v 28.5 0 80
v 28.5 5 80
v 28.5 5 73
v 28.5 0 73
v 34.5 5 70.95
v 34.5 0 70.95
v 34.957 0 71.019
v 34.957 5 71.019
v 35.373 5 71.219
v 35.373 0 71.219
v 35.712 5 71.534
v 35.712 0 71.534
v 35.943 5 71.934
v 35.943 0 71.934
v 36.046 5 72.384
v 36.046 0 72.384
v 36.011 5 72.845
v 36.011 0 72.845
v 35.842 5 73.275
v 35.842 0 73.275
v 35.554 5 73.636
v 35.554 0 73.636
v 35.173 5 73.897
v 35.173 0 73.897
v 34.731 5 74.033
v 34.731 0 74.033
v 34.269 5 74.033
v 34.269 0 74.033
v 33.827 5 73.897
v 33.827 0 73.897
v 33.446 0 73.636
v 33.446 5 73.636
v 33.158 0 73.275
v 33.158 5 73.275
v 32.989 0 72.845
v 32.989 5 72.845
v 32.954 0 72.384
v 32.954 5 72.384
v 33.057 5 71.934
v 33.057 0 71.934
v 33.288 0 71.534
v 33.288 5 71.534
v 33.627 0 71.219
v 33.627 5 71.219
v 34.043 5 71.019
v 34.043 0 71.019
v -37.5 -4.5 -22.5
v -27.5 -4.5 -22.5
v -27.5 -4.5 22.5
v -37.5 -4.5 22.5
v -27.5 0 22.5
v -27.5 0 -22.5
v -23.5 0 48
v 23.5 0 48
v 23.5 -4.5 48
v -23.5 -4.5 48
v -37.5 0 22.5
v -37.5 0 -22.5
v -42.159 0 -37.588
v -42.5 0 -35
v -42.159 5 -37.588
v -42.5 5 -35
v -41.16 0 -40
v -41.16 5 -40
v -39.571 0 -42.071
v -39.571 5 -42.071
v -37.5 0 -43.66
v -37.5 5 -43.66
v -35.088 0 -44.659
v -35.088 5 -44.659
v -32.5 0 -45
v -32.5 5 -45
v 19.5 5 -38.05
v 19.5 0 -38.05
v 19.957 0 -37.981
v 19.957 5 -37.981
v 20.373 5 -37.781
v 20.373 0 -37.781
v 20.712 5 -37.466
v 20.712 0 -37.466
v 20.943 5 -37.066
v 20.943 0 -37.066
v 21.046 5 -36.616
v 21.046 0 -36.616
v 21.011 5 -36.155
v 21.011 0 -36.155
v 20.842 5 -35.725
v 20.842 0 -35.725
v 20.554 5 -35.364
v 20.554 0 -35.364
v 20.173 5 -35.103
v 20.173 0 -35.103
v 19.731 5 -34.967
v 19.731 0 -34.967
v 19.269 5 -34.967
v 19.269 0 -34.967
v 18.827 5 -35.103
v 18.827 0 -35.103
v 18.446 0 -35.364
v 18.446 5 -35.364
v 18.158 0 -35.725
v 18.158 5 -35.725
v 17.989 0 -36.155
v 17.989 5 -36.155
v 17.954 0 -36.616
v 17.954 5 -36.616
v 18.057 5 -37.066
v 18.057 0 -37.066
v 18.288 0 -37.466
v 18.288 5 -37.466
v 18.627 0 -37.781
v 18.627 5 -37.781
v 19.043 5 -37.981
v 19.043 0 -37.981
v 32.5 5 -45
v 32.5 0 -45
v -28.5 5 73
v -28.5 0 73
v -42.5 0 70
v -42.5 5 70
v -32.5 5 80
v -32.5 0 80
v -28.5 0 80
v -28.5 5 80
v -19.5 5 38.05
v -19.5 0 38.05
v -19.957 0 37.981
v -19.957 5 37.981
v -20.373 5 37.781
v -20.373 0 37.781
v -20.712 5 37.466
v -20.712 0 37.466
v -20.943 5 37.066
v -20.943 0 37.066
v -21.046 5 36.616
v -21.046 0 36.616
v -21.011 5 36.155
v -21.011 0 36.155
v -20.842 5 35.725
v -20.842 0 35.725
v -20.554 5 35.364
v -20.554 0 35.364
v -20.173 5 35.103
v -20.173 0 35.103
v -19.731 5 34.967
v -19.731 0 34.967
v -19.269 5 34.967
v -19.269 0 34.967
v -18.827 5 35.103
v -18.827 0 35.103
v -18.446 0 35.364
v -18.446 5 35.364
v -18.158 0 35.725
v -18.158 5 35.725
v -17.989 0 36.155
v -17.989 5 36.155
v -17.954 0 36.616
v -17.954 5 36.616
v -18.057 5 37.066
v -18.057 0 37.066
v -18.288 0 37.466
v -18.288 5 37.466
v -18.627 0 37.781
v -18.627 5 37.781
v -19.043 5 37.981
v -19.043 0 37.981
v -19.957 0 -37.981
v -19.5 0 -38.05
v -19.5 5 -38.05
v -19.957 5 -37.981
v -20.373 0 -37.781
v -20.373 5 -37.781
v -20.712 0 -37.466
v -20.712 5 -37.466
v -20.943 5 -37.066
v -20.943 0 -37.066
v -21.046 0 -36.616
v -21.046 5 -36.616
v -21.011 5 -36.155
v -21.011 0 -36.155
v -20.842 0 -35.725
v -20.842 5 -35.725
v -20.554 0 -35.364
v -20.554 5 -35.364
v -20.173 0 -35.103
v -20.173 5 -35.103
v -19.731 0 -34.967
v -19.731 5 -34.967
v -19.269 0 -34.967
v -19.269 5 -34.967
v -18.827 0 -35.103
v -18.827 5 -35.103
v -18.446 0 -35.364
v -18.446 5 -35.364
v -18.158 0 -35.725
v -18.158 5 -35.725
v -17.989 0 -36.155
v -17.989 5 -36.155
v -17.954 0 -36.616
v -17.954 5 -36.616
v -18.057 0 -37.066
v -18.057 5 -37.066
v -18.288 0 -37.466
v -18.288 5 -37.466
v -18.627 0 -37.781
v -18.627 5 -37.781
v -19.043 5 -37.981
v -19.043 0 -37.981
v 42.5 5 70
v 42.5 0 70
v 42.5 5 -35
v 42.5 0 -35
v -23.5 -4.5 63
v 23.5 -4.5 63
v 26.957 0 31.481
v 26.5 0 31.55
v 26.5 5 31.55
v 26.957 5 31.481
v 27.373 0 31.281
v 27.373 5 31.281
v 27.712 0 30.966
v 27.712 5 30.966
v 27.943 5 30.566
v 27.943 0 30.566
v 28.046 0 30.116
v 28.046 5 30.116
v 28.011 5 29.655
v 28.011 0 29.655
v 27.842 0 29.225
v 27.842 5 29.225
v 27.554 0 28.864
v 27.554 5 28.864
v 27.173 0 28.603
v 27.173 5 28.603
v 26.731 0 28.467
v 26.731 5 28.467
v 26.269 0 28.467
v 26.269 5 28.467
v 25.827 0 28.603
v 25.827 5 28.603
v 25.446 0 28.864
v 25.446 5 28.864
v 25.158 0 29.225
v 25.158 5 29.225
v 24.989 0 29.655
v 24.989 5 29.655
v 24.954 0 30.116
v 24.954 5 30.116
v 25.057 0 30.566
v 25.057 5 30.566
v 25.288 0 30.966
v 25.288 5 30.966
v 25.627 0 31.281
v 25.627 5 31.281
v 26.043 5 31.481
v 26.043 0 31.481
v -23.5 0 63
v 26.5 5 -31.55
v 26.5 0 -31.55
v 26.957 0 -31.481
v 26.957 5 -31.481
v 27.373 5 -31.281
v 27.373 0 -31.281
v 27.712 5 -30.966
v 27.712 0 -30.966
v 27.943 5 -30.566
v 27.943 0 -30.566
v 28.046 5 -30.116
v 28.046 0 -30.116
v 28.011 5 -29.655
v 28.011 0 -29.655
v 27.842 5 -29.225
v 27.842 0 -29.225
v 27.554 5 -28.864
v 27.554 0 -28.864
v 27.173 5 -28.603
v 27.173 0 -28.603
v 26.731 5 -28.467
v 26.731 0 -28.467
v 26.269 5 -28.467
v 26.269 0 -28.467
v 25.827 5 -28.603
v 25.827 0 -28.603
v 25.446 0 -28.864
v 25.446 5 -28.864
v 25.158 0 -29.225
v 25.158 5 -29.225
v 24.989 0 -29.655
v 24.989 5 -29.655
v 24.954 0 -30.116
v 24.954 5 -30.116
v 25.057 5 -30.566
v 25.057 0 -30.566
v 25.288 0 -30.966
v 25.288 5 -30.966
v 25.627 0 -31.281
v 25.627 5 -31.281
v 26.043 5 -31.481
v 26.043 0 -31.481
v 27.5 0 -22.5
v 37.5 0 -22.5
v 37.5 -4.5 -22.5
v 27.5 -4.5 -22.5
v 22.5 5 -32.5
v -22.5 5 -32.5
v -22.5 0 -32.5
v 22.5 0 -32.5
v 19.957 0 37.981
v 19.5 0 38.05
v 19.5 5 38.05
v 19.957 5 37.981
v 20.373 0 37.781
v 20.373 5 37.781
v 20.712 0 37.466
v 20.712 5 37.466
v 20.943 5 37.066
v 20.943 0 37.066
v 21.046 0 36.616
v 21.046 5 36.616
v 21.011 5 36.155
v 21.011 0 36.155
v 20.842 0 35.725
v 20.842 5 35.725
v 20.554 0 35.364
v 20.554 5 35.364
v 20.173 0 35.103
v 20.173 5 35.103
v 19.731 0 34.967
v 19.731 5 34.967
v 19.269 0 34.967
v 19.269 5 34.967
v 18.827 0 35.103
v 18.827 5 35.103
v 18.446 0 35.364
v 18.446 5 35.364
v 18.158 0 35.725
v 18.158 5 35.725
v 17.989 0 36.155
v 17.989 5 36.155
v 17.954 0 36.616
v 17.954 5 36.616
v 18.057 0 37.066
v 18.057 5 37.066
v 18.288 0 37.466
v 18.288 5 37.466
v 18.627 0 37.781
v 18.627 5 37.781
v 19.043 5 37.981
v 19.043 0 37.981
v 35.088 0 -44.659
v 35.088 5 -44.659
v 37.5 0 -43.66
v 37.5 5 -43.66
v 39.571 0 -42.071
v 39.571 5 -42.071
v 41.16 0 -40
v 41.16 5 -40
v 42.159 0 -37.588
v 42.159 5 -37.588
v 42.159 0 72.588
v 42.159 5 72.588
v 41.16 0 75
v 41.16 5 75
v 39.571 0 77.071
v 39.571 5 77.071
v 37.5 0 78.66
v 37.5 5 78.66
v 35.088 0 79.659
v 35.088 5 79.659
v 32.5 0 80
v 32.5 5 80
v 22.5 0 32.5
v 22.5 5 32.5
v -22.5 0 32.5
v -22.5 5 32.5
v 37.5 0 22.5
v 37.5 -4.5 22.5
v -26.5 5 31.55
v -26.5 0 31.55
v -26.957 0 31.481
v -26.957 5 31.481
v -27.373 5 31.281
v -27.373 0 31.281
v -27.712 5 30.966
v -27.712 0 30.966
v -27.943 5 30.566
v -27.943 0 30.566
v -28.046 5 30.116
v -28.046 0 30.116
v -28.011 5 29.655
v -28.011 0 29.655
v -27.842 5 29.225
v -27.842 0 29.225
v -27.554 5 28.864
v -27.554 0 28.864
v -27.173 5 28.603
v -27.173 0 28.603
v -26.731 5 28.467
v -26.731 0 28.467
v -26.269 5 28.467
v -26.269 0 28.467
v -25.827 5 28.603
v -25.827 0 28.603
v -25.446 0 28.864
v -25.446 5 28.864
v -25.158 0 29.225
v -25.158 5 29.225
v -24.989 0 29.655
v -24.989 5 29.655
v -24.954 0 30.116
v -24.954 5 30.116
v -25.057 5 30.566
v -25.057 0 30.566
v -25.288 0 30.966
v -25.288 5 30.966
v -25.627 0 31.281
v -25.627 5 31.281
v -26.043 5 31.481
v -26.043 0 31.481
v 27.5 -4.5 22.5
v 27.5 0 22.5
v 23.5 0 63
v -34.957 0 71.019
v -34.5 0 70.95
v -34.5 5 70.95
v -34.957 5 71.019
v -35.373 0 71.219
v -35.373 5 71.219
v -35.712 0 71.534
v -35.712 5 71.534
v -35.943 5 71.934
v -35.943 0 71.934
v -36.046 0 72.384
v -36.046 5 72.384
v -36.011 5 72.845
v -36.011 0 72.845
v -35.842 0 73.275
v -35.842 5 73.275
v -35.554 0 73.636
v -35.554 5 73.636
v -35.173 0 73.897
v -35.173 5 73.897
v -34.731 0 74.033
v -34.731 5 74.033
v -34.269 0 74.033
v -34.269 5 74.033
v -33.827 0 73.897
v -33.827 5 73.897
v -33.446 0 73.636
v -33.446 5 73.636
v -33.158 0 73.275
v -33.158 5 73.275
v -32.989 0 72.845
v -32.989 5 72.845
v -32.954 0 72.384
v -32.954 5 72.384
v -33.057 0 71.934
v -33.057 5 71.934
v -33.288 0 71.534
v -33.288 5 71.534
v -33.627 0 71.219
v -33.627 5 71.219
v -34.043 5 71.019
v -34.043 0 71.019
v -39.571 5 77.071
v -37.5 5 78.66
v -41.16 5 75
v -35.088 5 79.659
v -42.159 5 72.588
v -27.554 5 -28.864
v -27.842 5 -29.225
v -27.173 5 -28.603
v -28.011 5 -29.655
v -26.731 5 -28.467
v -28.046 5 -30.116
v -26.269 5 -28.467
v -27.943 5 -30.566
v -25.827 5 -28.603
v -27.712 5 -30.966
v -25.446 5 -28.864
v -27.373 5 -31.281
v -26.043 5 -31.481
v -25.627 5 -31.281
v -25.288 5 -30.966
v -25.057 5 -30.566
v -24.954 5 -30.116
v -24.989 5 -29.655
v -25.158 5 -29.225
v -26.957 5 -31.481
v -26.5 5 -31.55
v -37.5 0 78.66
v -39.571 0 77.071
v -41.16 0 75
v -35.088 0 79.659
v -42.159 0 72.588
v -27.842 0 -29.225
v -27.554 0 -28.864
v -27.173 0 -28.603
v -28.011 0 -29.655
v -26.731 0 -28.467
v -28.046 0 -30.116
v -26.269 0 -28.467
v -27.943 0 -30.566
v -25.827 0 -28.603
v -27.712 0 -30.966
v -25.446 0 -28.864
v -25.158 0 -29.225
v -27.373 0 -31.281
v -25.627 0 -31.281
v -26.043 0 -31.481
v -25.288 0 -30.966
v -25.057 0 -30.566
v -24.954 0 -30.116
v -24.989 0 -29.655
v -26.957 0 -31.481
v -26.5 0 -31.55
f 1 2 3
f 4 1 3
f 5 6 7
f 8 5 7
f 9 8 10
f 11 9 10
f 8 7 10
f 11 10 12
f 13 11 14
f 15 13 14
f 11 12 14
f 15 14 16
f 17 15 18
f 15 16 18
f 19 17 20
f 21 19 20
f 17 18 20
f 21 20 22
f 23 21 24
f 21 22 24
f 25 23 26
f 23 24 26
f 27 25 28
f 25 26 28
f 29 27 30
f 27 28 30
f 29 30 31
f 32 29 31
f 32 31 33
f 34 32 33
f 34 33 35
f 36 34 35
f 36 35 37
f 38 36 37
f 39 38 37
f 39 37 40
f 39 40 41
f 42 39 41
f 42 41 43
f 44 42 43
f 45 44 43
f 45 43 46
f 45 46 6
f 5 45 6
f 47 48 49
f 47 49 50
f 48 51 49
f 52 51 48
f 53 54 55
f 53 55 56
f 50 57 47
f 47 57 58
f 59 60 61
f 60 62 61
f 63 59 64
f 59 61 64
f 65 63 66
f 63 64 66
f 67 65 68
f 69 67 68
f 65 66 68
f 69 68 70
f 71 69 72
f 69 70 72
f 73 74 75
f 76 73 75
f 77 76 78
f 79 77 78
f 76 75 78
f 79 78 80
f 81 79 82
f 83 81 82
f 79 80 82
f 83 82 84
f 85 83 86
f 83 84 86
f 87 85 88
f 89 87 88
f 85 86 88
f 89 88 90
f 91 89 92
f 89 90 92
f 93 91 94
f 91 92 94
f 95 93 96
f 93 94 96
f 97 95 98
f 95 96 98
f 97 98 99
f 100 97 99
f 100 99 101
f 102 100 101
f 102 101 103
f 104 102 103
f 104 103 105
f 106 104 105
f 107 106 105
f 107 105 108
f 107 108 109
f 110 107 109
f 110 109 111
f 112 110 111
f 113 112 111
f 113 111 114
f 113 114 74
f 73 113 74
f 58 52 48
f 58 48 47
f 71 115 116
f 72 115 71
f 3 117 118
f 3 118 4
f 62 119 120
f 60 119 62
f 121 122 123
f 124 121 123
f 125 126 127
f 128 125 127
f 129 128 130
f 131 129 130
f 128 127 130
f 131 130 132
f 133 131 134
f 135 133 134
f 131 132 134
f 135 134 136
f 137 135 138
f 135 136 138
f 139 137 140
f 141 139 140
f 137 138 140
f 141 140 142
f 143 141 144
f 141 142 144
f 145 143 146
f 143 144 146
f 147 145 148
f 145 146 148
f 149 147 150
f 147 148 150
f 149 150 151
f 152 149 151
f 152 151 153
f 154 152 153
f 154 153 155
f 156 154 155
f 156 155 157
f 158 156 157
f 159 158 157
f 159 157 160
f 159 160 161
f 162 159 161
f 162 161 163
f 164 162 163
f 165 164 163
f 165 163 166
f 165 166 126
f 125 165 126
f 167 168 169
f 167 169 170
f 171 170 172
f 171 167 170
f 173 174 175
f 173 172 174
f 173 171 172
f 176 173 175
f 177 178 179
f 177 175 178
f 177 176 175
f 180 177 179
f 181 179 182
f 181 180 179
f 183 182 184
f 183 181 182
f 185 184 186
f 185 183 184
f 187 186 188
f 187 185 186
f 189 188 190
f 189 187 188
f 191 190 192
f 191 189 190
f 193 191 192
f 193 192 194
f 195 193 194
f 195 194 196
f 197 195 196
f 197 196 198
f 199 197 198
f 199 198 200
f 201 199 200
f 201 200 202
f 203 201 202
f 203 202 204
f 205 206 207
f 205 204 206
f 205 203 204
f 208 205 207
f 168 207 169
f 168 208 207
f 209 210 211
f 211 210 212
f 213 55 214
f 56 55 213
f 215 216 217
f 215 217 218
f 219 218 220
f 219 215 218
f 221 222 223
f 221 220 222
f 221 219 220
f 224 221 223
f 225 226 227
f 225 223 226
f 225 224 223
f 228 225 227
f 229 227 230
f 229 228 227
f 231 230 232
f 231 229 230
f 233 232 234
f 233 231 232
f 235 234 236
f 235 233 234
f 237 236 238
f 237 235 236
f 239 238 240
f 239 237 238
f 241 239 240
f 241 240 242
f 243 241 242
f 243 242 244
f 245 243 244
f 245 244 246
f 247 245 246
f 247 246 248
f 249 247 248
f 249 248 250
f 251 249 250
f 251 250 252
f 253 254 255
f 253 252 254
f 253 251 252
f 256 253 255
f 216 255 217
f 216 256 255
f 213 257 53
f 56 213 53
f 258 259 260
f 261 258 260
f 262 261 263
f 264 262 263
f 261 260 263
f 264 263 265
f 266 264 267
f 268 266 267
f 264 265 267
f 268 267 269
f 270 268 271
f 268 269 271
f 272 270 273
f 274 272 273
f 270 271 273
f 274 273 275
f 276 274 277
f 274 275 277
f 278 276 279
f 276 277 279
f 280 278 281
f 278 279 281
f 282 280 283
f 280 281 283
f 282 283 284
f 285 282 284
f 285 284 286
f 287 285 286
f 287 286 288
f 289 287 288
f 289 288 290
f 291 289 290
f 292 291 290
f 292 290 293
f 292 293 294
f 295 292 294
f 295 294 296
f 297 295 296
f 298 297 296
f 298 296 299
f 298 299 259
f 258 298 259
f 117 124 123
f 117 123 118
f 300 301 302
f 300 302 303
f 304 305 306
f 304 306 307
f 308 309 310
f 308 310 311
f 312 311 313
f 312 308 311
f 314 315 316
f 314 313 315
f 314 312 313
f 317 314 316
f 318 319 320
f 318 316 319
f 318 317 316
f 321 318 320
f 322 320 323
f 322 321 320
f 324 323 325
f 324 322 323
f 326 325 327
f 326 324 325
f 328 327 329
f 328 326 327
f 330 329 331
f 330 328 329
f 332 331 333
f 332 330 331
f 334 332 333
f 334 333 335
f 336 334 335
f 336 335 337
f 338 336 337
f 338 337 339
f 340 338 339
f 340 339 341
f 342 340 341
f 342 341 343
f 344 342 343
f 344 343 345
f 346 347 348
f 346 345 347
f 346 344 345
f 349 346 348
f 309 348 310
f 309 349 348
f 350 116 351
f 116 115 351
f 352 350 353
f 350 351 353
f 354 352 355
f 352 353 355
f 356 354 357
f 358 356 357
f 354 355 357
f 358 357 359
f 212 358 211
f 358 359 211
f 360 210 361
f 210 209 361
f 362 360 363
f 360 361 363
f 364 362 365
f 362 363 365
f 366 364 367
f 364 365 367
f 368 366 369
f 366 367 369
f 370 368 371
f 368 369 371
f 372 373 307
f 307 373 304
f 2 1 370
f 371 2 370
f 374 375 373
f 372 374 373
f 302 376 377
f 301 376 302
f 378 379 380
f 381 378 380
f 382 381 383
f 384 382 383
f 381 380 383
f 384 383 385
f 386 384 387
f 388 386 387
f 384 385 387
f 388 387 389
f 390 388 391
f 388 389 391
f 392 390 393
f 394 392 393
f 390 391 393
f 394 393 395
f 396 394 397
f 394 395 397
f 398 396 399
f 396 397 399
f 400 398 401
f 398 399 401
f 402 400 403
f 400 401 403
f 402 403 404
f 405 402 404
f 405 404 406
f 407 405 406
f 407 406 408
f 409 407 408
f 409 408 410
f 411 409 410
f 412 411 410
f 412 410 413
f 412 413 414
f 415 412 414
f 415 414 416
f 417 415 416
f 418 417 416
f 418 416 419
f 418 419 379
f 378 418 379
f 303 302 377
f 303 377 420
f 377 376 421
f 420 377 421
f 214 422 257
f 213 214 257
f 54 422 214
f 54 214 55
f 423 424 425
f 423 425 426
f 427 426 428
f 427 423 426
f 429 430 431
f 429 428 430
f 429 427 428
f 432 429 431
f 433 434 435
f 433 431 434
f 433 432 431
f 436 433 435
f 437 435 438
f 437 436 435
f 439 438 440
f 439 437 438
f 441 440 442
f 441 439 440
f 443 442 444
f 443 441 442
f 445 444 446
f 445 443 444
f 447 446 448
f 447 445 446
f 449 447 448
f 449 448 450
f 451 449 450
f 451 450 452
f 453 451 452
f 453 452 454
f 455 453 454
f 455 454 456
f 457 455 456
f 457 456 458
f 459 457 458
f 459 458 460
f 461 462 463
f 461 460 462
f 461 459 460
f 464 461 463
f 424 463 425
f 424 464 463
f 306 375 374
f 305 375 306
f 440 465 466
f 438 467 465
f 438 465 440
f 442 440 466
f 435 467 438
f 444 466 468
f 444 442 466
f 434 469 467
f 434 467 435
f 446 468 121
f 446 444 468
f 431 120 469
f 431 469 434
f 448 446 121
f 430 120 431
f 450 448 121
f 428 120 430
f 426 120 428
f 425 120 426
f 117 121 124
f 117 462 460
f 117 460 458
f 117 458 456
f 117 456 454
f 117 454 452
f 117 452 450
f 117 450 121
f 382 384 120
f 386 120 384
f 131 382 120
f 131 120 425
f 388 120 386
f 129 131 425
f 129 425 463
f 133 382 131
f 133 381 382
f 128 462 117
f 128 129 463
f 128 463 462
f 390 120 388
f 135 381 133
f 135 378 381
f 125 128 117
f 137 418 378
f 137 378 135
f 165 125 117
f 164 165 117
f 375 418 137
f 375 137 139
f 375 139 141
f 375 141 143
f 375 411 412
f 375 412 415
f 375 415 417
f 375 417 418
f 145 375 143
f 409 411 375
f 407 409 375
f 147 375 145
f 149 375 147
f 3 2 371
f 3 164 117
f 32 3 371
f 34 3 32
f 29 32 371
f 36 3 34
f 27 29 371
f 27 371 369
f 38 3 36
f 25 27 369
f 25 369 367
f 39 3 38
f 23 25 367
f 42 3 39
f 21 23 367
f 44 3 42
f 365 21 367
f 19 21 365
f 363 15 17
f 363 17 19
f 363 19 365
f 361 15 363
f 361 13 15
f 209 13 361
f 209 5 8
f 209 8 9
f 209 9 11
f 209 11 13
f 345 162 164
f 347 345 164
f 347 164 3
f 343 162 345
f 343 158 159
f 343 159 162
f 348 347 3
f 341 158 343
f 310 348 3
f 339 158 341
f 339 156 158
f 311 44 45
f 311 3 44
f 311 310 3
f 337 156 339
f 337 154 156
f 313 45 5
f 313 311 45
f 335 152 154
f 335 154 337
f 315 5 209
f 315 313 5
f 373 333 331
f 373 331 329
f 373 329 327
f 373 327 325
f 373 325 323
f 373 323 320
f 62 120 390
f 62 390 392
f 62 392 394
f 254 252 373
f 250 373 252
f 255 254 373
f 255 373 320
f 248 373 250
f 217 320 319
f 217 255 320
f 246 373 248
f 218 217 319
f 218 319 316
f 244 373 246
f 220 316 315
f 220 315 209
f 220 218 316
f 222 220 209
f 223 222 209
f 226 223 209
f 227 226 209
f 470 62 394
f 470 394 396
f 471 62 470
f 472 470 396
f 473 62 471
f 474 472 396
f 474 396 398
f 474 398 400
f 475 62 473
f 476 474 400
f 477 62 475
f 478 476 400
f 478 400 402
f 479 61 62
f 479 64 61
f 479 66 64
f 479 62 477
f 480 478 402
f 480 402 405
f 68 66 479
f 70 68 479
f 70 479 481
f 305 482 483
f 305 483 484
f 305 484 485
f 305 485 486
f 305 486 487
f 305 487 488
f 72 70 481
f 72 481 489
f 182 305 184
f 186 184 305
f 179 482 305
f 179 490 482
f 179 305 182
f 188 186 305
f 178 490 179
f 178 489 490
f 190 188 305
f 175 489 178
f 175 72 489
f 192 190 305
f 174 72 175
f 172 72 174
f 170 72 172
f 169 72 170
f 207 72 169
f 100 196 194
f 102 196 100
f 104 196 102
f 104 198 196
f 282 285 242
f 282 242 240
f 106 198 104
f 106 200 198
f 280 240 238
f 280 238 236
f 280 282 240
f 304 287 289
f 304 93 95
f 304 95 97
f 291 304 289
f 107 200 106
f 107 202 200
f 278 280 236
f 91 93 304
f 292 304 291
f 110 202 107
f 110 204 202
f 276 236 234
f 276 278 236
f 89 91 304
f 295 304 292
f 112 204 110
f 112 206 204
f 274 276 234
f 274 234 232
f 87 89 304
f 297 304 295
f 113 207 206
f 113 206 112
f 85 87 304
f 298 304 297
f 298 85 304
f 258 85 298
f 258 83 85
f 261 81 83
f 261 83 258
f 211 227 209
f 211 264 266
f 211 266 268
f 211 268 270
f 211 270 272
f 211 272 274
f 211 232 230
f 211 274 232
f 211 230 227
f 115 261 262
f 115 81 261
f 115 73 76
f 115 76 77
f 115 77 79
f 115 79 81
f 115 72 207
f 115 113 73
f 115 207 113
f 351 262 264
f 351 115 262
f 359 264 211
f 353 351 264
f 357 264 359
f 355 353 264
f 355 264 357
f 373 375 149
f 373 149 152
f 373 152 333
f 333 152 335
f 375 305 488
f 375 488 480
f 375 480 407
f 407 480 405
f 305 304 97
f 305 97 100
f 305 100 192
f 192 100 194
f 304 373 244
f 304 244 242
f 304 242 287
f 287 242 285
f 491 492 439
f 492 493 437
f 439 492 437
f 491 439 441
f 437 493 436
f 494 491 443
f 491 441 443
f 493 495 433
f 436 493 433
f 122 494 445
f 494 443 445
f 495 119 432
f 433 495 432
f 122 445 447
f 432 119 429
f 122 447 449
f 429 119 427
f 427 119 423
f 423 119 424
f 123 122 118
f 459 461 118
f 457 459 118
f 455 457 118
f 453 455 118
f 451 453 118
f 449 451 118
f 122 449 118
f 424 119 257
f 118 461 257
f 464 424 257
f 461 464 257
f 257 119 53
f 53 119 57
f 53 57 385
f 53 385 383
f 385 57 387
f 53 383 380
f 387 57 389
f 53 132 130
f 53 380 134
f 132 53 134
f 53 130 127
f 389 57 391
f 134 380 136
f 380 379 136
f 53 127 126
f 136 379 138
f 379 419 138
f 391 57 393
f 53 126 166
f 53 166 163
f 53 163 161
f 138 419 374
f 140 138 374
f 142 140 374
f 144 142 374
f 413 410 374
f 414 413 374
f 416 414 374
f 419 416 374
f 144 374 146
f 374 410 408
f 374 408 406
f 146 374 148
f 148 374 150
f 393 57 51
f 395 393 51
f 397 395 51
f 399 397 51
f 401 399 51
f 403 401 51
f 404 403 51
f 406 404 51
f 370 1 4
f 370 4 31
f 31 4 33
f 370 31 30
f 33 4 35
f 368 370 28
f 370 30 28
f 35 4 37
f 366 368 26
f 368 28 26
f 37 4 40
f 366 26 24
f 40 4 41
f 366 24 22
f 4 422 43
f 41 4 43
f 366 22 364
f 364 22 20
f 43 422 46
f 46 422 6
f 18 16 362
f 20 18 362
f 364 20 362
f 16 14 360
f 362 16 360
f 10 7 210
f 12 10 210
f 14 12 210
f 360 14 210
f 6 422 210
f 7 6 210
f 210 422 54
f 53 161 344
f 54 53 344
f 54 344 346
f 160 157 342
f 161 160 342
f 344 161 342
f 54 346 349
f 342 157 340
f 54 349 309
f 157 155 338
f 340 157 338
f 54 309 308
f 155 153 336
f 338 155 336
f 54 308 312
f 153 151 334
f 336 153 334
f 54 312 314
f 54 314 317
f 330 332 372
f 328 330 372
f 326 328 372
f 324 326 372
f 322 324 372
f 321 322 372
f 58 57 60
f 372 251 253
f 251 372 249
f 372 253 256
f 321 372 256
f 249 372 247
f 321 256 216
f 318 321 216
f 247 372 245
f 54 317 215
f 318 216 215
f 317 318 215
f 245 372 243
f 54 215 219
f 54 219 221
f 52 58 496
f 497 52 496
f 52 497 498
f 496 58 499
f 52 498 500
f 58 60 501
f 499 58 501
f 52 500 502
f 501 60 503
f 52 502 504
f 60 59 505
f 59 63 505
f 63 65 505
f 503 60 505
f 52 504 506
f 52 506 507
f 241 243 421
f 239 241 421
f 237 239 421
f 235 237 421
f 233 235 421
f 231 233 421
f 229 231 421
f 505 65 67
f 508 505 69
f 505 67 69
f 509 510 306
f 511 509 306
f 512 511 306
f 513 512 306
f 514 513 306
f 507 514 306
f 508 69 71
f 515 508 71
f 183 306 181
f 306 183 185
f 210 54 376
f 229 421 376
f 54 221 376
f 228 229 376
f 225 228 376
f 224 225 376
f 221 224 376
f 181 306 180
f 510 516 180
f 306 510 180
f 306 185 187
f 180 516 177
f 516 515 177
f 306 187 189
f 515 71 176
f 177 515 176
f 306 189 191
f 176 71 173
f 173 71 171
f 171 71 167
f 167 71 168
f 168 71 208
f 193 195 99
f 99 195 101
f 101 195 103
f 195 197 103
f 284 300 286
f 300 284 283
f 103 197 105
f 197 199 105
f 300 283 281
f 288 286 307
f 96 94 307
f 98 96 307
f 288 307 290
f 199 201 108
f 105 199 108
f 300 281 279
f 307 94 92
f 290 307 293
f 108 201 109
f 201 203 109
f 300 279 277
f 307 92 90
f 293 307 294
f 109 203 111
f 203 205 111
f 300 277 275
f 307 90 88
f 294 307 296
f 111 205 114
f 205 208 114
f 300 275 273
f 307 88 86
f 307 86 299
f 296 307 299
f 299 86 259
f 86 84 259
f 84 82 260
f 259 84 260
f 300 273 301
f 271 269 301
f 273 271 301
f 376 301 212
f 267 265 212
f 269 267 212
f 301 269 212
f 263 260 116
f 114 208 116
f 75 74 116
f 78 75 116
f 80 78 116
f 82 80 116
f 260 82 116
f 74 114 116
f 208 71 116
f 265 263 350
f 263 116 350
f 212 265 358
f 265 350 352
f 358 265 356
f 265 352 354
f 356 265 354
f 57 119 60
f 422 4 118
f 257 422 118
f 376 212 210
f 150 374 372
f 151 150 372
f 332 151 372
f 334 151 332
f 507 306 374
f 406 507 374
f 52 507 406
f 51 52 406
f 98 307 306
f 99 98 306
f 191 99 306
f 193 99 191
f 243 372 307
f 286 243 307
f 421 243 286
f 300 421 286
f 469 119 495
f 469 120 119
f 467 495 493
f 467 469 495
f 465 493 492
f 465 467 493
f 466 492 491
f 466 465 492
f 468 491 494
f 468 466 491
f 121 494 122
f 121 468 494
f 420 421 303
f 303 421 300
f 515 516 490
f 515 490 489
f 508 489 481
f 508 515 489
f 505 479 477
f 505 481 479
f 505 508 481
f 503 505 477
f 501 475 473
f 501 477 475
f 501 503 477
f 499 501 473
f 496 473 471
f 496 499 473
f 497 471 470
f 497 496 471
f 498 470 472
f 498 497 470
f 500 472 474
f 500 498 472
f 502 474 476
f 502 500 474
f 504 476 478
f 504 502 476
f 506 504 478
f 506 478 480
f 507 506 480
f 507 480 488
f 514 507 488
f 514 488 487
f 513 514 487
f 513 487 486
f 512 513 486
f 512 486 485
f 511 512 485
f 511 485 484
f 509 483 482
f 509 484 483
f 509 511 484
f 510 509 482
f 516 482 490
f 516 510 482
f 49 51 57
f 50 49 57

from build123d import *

# Parameters (mm, degrees)
SKETCH1_W             = 85
SKETCH1_H             = 160
BOSS_EXTRUDE1_DEPTH   = 5
SKETCH2_W             = 45
SKETCH2_H             = 65
CUT_EXTRUDE1_DEPTH    = 91.726236558
SKETCH8_W             = 57
SKETCH8_H             = 14
CUT_EXTRUDE2_DEPTH    = 91.726236558
F_2_0MM_DOWEL_HOLE1_D = 3.1
MIRROR9_COPY_1_D      = 3.1
F_2_0MM_DOWEL_HOLE3_D = 3.1
MIRROR11_COPY_1_D     = 3.1
F_2_5MM_DOWEL_HOLE4_D = 3.1
SKETCH39_W            = 85
SKETCH39_H            = 5
CUT_EXTRUDE3_DEPTH    = 35
FILLET1_R             = 10
SKETCH41_W            = 47
SKETCH41_H            = 15
SKETCH41_W_2          = 10
SKETCH41_H_2          = 45
BOSS_EXTRUDE3_DEPTH   = 4.5


with BuildPart() as part:
    # Sketch1 → Boss-Extrude1 (new body)
    with BuildSketch(Plane(origin=(0, 0, 0), x_dir=(1, 0, 0), z_dir=(0, 1, 0))):
        Rectangle(SKETCH1_W, SKETCH1_H)
    extrude(amount=BOSS_EXTRUDE1_DEPTH)

    # Sketch2 → Cut-Extrude1 (cut, through all)
    with BuildSketch(Plane(origin=(0, 5, 0), x_dir=(1, 0, 0), z_dir=(0, 1, 0))):
        Rectangle(SKETCH2_W, SKETCH2_H)
    extrude(amount=-CUT_EXTRUDE1_DEPTH, mode=Mode.SUBTRACT)

    # Sketch8 → Cut-Extrude2 (cut, through all)
    with BuildSketch(Plane(origin=(0, 5, 0), x_dir=(1, 0, 0), z_dir=(0, 1, 0))):
        with Locations((0, -80)):
            Rectangle(SKETCH8_W, SKETCH8_H)
    extrude(amount=-CUT_EXTRUDE2_DEPTH, mode=Mode.SUBTRACT)

    # Ø2.0mm Dowel Hole1 (through all)
    with Locations(Plane(origin=(26.5, 5, -30), x_dir=(0, 0, 1), z_dir=(0, 1, 0))):
        with Locations((0, 0)):
            f_2_0mm_dowel_hole1 = Hole(F_2_0MM_DOWEL_HOLE1_D / 2)

    # Mirror8: Ø2.0mm Dowel Hole1 across plane
    add(f_2_0mm_dowel_hole1.mirror(Plane(origin=(0, 0, 0), x_dir=(0, 0, 1), z_dir=(1, 0, 0))), mode=Mode.SUBTRACT)

    # Mirror9: Ø2.0mm Dowel Hole1 across plane
    add(f_2_0mm_dowel_hole1.mirror(Plane.XY), mode=Mode.SUBTRACT)

    # Mirror9 copy 1 (through all)
    with Locations(Plane(origin=(-26.5, 5, 30), x_dir=(0, 0, -1), z_dir=(0, 1, 0))):
        with Locations((0, 0)):
            Hole(MIRROR9_COPY_1_D / 2)

    # Ø2.0mm Dowel Hole3 (through all)
    with Locations(Plane(origin=(19.5, 5, -36.5), x_dir=(0, 0, 1), z_dir=(0, 1, 0))):
        with Locations((0, 0)):
            f_2_0mm_dowel_hole3 = Hole(F_2_0MM_DOWEL_HOLE3_D / 2)

    # Mirror10: Ø2.0mm Dowel Hole3 across plane
    add(f_2_0mm_dowel_hole3.mirror(Plane(origin=(0, 0, 0), x_dir=(0, 0, 1), z_dir=(1, 0, 0))), mode=Mode.SUBTRACT)

    # Mirror11: Ø2.0mm Dowel Hole3 across plane
    add(f_2_0mm_dowel_hole3.mirror(Plane.XY), mode=Mode.SUBTRACT)

    # Mirror11 copy 1 (through all)
    with Locations(Plane(origin=(-19.5, 5, 36.5), x_dir=(0, 0, -1), z_dir=(0, 1, 0))):
        with Locations((0, 0)):
            Hole(MIRROR11_COPY_1_D / 2)

    # Ø2.5mm Dowel Hole4 (through all)
    with Locations(Plane(origin=(34.5, 5, 72.5), x_dir=(0, 0, 1), z_dir=(0, 1, 0))):
        with Locations((0, 0)):
            f_2_5mm_dowel_hole4 = Hole(F_2_5MM_DOWEL_HOLE4_D / 2)

    # Mirror12: Ø2.5mm Dowel Hole4 across plane
    add(f_2_5mm_dowel_hole4.mirror(Plane(origin=(0, 0, 0), x_dir=(0, 0, 1), z_dir=(1, 0, 0))), mode=Mode.SUBTRACT)

    # Sketch39 → Cut-Extrude3 (cut)
    with BuildSketch(Plane(origin=(0, 0, -80), x_dir=(-1, 0, 0), z_dir=(0, 0, -1))):
        with Locations((0, 2.5)):
            Rectangle(SKETCH39_W, SKETCH39_H)
    extrude(amount=-CUT_EXTRUDE3_DEPTH, mode=Mode.SUBTRACT)

    # Fillet1
    fillet1_edges = [part.edges().sort_by_distance(p)[0] for p in [
        (-42.5, 2.5, -45),
        (42.5, 2.5, -45),
        (42.5, 2.5, 80),
        (-42.5, 2.5, 80),
    ]]
    fillet(fillet1_edges, radius=FILLET1_R)

    # Sketch41 → Boss-Extrude3 (add)
    with BuildSketch(Plane(origin=(0, 0, 0), x_dir=(-1, 0, 0), z_dir=(0, -1, 0))):
        with Locations((0, -55.5)):
            Rectangle(SKETCH41_W, SKETCH41_H)
        with Locations((32.5, 0)):
            Rectangle(SKETCH41_W_2, SKETCH41_H_2)
        with Locations((-32.5, 0)):
            Rectangle(SKETCH41_W_2, SKETCH41_H_2)
    extrude(amount=BOSS_EXTRUDE3_DEPTH)


solid = part.part
